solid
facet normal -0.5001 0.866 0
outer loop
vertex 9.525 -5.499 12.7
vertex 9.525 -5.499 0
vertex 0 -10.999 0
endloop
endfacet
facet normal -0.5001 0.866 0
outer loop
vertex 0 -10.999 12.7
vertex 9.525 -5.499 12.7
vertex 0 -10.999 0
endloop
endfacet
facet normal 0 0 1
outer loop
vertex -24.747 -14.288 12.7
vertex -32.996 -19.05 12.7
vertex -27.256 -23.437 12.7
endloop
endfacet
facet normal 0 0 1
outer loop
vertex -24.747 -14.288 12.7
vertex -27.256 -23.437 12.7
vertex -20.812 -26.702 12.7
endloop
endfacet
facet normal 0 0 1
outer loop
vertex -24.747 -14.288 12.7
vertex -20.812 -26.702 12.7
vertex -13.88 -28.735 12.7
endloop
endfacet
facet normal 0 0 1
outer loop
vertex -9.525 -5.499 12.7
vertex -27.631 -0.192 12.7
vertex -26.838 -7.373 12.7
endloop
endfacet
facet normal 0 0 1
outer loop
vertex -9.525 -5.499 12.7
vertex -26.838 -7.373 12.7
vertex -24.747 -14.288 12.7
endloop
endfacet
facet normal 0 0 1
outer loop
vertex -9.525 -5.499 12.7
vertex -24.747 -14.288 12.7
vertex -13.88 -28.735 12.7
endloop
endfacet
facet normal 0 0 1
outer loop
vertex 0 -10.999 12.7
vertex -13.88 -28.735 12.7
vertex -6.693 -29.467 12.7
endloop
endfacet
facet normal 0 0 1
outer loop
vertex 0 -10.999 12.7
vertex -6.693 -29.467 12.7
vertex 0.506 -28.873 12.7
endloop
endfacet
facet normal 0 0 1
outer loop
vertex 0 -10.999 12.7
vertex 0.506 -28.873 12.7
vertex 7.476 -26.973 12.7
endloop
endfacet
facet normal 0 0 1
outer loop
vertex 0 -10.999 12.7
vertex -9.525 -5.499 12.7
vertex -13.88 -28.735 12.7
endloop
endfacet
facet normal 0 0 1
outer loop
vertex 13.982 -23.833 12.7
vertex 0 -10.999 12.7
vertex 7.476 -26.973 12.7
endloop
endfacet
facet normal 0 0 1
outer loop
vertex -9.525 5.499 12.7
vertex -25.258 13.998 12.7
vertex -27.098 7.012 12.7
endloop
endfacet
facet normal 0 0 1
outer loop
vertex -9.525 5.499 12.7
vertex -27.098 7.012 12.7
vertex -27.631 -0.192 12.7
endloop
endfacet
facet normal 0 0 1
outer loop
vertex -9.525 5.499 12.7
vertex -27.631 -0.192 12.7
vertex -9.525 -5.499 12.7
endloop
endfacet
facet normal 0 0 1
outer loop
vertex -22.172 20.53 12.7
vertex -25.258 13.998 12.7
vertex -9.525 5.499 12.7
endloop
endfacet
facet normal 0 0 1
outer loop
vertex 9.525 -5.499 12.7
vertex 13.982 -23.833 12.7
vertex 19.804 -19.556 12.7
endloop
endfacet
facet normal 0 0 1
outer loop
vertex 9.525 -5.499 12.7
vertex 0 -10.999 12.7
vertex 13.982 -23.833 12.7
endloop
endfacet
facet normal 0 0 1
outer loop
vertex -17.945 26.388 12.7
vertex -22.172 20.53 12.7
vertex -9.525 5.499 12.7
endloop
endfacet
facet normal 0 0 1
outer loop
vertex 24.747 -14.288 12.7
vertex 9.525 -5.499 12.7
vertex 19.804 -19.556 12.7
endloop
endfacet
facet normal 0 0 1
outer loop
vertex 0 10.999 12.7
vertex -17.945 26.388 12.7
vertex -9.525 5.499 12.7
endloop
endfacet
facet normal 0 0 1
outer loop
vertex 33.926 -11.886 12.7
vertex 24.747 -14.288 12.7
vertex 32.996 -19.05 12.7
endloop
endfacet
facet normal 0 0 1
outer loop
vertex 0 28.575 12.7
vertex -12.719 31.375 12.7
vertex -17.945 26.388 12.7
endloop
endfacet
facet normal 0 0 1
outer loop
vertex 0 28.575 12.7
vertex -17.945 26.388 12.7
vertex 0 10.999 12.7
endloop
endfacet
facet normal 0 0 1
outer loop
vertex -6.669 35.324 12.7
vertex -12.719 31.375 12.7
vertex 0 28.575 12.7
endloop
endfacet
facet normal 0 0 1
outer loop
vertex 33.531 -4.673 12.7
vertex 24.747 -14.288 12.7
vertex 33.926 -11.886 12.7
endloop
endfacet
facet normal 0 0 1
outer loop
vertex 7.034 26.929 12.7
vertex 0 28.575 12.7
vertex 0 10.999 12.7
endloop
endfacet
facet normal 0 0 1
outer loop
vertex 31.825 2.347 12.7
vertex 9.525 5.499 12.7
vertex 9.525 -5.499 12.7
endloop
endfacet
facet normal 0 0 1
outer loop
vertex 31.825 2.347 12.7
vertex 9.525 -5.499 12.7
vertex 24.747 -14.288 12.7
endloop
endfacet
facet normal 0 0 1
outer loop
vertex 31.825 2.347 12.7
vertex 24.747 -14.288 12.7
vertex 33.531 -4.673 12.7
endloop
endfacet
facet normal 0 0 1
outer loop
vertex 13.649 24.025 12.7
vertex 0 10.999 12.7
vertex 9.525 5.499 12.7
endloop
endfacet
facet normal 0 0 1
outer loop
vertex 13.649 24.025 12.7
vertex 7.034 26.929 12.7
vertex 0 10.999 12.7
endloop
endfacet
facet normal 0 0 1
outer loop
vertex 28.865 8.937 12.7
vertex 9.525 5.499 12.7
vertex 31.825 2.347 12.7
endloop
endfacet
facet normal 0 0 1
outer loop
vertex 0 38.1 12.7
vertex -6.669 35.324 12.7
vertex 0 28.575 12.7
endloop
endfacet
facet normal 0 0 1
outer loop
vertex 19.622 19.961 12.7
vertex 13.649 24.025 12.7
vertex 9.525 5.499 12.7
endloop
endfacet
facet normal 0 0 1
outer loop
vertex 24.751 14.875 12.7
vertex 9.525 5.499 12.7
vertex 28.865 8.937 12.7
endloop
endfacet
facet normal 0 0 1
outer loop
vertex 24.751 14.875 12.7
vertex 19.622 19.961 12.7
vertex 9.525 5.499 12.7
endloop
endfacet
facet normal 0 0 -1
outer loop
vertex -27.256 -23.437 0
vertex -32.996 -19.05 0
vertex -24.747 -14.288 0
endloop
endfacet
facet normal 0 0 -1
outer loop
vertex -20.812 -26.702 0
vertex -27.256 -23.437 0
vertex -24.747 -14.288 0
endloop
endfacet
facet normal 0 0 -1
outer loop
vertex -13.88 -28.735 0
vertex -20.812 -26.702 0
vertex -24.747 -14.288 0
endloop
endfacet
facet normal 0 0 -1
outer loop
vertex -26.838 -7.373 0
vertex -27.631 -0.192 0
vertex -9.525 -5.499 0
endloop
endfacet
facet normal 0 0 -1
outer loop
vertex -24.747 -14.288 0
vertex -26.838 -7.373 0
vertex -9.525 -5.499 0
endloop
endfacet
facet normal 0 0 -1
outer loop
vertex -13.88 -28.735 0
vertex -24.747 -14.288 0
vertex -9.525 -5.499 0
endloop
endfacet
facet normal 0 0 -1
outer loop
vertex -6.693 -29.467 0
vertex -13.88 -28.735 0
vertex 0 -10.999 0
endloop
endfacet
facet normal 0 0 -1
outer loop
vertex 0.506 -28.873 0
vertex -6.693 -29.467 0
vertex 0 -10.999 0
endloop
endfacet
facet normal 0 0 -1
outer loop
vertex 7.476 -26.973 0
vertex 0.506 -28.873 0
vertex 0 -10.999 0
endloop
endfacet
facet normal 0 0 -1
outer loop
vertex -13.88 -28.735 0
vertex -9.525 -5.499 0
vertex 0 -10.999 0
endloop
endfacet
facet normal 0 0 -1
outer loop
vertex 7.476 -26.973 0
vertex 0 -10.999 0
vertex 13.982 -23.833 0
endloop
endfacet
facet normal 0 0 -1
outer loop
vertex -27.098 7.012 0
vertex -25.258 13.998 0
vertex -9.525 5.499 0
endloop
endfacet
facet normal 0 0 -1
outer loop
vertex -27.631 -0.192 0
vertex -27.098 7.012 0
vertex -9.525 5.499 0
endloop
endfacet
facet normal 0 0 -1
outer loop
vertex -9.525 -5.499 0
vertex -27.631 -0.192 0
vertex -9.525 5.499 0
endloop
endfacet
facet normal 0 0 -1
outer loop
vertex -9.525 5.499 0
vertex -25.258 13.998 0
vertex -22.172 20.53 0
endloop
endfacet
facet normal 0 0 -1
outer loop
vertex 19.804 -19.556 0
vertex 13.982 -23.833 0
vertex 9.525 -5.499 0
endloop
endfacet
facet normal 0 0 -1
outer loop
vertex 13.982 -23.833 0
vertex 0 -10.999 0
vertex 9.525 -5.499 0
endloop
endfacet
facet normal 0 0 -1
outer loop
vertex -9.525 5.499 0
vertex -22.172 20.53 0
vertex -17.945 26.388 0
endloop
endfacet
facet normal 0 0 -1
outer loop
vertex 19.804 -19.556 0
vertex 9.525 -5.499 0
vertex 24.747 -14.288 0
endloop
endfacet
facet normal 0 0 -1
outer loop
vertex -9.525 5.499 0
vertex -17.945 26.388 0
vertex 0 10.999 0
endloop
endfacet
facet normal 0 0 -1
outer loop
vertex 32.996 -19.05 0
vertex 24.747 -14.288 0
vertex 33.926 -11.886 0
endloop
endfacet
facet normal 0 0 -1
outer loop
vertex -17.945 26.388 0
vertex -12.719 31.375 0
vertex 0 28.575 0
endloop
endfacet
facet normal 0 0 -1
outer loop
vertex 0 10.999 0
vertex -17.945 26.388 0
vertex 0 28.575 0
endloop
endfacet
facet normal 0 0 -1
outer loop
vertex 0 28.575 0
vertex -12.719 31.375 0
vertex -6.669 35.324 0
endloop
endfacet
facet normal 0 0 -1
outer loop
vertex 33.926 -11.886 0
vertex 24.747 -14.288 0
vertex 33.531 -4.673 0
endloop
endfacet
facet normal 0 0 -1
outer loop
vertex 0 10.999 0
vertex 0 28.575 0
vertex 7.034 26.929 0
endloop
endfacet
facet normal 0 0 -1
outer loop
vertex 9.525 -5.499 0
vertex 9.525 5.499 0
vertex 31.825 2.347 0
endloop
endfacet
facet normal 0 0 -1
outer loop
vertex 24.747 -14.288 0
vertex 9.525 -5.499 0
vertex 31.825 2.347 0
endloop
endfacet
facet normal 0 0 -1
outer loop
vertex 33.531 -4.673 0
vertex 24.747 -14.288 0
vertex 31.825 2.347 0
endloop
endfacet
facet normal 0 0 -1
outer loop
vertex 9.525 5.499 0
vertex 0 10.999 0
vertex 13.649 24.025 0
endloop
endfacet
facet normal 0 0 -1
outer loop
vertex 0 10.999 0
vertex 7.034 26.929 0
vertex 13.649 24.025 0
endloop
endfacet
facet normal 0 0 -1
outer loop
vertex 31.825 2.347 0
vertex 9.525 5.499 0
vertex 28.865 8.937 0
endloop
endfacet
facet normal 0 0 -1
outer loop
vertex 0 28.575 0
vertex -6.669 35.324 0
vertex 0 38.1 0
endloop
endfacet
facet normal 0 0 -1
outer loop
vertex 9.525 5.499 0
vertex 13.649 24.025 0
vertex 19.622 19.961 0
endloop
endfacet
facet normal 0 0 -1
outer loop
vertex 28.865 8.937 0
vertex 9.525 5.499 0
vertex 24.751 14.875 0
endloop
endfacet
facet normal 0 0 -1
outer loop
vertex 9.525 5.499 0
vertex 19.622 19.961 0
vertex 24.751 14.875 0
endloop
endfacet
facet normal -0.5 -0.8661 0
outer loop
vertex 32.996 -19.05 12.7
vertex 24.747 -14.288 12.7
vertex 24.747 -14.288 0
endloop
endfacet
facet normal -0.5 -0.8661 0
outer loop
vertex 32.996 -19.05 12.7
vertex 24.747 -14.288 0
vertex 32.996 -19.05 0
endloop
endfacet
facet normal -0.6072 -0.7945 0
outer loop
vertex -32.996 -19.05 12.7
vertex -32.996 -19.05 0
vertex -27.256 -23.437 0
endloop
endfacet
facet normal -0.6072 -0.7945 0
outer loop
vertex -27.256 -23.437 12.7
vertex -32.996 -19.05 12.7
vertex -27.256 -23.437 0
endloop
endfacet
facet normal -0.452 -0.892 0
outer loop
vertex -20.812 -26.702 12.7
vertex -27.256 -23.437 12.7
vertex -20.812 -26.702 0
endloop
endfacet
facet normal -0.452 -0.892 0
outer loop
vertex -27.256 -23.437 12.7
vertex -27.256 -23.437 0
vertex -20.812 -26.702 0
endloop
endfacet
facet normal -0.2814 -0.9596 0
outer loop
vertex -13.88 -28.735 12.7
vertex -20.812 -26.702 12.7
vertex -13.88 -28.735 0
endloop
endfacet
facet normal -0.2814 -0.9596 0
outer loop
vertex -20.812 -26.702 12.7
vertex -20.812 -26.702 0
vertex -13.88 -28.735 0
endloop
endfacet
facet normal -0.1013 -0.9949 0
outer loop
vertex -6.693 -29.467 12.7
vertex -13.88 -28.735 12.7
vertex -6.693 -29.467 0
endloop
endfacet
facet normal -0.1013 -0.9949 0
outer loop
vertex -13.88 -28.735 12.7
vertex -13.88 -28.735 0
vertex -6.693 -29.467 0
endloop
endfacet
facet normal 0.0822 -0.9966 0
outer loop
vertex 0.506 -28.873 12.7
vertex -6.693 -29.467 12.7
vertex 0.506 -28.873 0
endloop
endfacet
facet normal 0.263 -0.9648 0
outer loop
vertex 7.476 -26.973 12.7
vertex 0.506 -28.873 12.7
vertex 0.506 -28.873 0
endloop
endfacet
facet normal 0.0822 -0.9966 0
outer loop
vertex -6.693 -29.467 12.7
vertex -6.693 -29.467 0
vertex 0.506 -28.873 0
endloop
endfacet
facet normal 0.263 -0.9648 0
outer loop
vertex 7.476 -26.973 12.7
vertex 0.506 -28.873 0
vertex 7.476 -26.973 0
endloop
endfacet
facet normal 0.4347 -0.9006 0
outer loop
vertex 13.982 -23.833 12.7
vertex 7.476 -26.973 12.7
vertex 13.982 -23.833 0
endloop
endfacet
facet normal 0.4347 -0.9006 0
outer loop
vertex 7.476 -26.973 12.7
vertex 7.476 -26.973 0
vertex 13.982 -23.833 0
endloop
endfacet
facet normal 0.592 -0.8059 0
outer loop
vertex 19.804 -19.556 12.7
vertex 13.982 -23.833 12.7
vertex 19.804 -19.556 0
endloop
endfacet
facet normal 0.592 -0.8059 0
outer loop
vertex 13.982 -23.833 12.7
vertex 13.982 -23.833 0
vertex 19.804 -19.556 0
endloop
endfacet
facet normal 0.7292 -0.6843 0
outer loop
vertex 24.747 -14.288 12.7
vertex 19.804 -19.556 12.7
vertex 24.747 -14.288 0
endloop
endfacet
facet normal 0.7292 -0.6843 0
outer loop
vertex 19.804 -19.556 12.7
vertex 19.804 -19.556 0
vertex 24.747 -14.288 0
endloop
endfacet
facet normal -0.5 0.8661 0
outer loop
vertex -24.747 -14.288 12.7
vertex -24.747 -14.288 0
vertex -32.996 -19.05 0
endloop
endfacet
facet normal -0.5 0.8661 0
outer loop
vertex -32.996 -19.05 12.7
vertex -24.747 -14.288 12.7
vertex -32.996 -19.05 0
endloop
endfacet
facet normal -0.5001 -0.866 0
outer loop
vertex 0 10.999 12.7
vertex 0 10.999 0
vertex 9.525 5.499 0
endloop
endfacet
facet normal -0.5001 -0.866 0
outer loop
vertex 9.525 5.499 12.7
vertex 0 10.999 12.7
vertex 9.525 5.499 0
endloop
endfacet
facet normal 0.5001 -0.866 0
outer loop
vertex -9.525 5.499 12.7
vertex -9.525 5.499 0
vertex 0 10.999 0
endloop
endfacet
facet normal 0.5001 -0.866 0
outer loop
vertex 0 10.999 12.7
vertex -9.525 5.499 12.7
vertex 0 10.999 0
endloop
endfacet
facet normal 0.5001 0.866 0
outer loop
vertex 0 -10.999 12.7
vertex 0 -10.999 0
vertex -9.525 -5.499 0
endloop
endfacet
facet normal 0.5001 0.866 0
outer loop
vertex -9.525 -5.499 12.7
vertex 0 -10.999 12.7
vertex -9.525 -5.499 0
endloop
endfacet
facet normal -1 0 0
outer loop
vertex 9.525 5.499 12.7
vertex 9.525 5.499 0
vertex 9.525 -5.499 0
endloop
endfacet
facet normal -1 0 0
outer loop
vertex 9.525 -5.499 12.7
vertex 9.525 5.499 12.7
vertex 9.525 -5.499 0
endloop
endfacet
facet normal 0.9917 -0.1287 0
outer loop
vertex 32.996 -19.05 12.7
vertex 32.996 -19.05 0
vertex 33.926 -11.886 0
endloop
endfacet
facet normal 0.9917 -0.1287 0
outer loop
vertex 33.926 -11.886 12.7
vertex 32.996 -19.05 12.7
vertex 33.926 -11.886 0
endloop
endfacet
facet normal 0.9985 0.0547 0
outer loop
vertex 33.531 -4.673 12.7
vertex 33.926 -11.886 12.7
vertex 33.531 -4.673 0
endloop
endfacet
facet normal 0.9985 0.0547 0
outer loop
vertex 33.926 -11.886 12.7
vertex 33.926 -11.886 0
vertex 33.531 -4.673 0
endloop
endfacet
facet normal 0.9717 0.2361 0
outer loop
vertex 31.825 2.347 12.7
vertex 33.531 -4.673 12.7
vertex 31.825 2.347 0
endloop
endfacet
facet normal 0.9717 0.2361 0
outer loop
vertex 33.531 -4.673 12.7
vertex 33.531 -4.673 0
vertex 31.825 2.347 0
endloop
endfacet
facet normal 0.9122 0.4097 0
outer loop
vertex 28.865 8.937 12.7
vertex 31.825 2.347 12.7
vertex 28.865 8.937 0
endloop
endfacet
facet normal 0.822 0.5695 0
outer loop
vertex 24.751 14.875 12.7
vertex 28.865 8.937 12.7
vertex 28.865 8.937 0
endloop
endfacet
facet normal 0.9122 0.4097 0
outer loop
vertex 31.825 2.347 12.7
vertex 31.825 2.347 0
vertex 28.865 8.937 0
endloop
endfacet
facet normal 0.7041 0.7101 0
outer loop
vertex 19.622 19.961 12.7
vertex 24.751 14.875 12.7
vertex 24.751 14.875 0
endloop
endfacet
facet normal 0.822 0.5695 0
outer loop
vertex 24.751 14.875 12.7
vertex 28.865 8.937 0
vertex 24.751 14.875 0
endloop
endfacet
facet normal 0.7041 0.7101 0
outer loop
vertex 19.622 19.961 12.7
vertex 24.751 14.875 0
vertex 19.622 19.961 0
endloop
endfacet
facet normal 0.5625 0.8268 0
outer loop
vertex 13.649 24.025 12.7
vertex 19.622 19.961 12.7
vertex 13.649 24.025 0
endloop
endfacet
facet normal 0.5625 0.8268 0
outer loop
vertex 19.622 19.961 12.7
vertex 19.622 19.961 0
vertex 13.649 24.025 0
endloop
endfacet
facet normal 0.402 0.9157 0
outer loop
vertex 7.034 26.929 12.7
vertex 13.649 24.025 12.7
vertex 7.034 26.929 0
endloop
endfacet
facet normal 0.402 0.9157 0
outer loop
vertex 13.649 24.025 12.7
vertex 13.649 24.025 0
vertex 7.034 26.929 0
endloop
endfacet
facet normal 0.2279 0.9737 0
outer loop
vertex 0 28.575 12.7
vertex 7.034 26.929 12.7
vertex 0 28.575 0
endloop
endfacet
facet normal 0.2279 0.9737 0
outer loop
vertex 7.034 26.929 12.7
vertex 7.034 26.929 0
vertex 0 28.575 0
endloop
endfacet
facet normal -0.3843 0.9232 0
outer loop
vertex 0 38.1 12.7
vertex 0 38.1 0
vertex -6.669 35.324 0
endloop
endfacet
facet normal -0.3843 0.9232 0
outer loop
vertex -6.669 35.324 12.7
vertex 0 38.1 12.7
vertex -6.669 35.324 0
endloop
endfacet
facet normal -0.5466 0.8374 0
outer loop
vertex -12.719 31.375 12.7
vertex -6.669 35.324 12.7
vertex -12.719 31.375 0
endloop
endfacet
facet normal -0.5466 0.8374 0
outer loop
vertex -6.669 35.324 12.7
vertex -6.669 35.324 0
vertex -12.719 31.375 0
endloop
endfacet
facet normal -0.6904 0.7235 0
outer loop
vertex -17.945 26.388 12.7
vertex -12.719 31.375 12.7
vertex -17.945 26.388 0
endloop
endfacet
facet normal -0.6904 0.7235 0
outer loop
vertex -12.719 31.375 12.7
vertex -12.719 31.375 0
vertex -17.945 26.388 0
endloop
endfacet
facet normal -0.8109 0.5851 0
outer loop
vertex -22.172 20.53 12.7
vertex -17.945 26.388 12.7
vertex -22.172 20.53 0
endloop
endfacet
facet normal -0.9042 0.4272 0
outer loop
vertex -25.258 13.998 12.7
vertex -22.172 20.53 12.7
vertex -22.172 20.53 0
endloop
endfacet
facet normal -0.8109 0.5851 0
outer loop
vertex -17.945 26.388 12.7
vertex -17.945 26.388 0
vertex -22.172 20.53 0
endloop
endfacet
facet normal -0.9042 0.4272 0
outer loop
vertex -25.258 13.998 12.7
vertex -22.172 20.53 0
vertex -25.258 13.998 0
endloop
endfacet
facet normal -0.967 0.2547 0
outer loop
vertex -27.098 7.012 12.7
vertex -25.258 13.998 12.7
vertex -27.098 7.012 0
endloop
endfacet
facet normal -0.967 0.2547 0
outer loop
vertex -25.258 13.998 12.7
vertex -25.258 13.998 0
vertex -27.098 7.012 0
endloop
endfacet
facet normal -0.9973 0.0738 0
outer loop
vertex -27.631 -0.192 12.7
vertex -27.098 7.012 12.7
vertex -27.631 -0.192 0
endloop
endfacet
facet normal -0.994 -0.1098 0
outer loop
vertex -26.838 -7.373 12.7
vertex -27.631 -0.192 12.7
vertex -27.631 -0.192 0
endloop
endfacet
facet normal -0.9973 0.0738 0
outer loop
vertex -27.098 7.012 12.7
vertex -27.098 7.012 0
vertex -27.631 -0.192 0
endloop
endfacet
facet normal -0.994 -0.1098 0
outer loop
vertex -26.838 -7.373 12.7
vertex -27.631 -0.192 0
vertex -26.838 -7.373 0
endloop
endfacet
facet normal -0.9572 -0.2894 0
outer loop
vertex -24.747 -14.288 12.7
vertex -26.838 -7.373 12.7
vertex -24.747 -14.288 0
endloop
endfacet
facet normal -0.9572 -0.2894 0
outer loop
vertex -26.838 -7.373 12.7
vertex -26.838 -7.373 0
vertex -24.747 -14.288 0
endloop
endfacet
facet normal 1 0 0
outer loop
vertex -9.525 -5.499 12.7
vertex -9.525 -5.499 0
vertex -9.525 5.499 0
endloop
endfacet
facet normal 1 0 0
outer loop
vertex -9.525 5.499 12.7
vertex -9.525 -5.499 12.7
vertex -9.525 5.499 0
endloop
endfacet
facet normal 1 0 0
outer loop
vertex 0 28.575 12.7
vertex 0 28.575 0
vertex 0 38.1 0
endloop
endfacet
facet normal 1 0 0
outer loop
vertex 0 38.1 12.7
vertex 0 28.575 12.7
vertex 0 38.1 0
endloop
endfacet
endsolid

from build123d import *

# Parameters (mm, degrees)
F1_DEPTH = 12.7


with BuildPart() as f1:
    # F0 (on Top) → F1 (new body)
    with BuildSketch(Plane.XY):
        with BuildLine():
            Line((0, 28.575), (0, 38.1))
            ThreePointArc((0, 38.1), (-23.865153, 17.334725), (-24.746676, -14.2875))
            Line((-24.746676, -14.2875), (-32.995568, -19.05))
            ThreePointArc((-32.995568, -19.05), (-3.079736, -29.335191), (24.746676, -14.2875))
            Line((24.746676, -14.2875), (32.995568, -19.05))
            ThreePointArc((32.995568, -19.05), (26.944888, 12.000466), (0, 28.575))
        make_face()
        Polygon((0, 10.998523), (9.525, 5.499261), (9.525, -5.499261), (0, -10.998523), (-9.525, -5.499261), (-9.525, 5.499261), align=None, mode=Mode.SUBTRACT)
    extrude(amount=F1_DEPTH)


solid = f1.part
